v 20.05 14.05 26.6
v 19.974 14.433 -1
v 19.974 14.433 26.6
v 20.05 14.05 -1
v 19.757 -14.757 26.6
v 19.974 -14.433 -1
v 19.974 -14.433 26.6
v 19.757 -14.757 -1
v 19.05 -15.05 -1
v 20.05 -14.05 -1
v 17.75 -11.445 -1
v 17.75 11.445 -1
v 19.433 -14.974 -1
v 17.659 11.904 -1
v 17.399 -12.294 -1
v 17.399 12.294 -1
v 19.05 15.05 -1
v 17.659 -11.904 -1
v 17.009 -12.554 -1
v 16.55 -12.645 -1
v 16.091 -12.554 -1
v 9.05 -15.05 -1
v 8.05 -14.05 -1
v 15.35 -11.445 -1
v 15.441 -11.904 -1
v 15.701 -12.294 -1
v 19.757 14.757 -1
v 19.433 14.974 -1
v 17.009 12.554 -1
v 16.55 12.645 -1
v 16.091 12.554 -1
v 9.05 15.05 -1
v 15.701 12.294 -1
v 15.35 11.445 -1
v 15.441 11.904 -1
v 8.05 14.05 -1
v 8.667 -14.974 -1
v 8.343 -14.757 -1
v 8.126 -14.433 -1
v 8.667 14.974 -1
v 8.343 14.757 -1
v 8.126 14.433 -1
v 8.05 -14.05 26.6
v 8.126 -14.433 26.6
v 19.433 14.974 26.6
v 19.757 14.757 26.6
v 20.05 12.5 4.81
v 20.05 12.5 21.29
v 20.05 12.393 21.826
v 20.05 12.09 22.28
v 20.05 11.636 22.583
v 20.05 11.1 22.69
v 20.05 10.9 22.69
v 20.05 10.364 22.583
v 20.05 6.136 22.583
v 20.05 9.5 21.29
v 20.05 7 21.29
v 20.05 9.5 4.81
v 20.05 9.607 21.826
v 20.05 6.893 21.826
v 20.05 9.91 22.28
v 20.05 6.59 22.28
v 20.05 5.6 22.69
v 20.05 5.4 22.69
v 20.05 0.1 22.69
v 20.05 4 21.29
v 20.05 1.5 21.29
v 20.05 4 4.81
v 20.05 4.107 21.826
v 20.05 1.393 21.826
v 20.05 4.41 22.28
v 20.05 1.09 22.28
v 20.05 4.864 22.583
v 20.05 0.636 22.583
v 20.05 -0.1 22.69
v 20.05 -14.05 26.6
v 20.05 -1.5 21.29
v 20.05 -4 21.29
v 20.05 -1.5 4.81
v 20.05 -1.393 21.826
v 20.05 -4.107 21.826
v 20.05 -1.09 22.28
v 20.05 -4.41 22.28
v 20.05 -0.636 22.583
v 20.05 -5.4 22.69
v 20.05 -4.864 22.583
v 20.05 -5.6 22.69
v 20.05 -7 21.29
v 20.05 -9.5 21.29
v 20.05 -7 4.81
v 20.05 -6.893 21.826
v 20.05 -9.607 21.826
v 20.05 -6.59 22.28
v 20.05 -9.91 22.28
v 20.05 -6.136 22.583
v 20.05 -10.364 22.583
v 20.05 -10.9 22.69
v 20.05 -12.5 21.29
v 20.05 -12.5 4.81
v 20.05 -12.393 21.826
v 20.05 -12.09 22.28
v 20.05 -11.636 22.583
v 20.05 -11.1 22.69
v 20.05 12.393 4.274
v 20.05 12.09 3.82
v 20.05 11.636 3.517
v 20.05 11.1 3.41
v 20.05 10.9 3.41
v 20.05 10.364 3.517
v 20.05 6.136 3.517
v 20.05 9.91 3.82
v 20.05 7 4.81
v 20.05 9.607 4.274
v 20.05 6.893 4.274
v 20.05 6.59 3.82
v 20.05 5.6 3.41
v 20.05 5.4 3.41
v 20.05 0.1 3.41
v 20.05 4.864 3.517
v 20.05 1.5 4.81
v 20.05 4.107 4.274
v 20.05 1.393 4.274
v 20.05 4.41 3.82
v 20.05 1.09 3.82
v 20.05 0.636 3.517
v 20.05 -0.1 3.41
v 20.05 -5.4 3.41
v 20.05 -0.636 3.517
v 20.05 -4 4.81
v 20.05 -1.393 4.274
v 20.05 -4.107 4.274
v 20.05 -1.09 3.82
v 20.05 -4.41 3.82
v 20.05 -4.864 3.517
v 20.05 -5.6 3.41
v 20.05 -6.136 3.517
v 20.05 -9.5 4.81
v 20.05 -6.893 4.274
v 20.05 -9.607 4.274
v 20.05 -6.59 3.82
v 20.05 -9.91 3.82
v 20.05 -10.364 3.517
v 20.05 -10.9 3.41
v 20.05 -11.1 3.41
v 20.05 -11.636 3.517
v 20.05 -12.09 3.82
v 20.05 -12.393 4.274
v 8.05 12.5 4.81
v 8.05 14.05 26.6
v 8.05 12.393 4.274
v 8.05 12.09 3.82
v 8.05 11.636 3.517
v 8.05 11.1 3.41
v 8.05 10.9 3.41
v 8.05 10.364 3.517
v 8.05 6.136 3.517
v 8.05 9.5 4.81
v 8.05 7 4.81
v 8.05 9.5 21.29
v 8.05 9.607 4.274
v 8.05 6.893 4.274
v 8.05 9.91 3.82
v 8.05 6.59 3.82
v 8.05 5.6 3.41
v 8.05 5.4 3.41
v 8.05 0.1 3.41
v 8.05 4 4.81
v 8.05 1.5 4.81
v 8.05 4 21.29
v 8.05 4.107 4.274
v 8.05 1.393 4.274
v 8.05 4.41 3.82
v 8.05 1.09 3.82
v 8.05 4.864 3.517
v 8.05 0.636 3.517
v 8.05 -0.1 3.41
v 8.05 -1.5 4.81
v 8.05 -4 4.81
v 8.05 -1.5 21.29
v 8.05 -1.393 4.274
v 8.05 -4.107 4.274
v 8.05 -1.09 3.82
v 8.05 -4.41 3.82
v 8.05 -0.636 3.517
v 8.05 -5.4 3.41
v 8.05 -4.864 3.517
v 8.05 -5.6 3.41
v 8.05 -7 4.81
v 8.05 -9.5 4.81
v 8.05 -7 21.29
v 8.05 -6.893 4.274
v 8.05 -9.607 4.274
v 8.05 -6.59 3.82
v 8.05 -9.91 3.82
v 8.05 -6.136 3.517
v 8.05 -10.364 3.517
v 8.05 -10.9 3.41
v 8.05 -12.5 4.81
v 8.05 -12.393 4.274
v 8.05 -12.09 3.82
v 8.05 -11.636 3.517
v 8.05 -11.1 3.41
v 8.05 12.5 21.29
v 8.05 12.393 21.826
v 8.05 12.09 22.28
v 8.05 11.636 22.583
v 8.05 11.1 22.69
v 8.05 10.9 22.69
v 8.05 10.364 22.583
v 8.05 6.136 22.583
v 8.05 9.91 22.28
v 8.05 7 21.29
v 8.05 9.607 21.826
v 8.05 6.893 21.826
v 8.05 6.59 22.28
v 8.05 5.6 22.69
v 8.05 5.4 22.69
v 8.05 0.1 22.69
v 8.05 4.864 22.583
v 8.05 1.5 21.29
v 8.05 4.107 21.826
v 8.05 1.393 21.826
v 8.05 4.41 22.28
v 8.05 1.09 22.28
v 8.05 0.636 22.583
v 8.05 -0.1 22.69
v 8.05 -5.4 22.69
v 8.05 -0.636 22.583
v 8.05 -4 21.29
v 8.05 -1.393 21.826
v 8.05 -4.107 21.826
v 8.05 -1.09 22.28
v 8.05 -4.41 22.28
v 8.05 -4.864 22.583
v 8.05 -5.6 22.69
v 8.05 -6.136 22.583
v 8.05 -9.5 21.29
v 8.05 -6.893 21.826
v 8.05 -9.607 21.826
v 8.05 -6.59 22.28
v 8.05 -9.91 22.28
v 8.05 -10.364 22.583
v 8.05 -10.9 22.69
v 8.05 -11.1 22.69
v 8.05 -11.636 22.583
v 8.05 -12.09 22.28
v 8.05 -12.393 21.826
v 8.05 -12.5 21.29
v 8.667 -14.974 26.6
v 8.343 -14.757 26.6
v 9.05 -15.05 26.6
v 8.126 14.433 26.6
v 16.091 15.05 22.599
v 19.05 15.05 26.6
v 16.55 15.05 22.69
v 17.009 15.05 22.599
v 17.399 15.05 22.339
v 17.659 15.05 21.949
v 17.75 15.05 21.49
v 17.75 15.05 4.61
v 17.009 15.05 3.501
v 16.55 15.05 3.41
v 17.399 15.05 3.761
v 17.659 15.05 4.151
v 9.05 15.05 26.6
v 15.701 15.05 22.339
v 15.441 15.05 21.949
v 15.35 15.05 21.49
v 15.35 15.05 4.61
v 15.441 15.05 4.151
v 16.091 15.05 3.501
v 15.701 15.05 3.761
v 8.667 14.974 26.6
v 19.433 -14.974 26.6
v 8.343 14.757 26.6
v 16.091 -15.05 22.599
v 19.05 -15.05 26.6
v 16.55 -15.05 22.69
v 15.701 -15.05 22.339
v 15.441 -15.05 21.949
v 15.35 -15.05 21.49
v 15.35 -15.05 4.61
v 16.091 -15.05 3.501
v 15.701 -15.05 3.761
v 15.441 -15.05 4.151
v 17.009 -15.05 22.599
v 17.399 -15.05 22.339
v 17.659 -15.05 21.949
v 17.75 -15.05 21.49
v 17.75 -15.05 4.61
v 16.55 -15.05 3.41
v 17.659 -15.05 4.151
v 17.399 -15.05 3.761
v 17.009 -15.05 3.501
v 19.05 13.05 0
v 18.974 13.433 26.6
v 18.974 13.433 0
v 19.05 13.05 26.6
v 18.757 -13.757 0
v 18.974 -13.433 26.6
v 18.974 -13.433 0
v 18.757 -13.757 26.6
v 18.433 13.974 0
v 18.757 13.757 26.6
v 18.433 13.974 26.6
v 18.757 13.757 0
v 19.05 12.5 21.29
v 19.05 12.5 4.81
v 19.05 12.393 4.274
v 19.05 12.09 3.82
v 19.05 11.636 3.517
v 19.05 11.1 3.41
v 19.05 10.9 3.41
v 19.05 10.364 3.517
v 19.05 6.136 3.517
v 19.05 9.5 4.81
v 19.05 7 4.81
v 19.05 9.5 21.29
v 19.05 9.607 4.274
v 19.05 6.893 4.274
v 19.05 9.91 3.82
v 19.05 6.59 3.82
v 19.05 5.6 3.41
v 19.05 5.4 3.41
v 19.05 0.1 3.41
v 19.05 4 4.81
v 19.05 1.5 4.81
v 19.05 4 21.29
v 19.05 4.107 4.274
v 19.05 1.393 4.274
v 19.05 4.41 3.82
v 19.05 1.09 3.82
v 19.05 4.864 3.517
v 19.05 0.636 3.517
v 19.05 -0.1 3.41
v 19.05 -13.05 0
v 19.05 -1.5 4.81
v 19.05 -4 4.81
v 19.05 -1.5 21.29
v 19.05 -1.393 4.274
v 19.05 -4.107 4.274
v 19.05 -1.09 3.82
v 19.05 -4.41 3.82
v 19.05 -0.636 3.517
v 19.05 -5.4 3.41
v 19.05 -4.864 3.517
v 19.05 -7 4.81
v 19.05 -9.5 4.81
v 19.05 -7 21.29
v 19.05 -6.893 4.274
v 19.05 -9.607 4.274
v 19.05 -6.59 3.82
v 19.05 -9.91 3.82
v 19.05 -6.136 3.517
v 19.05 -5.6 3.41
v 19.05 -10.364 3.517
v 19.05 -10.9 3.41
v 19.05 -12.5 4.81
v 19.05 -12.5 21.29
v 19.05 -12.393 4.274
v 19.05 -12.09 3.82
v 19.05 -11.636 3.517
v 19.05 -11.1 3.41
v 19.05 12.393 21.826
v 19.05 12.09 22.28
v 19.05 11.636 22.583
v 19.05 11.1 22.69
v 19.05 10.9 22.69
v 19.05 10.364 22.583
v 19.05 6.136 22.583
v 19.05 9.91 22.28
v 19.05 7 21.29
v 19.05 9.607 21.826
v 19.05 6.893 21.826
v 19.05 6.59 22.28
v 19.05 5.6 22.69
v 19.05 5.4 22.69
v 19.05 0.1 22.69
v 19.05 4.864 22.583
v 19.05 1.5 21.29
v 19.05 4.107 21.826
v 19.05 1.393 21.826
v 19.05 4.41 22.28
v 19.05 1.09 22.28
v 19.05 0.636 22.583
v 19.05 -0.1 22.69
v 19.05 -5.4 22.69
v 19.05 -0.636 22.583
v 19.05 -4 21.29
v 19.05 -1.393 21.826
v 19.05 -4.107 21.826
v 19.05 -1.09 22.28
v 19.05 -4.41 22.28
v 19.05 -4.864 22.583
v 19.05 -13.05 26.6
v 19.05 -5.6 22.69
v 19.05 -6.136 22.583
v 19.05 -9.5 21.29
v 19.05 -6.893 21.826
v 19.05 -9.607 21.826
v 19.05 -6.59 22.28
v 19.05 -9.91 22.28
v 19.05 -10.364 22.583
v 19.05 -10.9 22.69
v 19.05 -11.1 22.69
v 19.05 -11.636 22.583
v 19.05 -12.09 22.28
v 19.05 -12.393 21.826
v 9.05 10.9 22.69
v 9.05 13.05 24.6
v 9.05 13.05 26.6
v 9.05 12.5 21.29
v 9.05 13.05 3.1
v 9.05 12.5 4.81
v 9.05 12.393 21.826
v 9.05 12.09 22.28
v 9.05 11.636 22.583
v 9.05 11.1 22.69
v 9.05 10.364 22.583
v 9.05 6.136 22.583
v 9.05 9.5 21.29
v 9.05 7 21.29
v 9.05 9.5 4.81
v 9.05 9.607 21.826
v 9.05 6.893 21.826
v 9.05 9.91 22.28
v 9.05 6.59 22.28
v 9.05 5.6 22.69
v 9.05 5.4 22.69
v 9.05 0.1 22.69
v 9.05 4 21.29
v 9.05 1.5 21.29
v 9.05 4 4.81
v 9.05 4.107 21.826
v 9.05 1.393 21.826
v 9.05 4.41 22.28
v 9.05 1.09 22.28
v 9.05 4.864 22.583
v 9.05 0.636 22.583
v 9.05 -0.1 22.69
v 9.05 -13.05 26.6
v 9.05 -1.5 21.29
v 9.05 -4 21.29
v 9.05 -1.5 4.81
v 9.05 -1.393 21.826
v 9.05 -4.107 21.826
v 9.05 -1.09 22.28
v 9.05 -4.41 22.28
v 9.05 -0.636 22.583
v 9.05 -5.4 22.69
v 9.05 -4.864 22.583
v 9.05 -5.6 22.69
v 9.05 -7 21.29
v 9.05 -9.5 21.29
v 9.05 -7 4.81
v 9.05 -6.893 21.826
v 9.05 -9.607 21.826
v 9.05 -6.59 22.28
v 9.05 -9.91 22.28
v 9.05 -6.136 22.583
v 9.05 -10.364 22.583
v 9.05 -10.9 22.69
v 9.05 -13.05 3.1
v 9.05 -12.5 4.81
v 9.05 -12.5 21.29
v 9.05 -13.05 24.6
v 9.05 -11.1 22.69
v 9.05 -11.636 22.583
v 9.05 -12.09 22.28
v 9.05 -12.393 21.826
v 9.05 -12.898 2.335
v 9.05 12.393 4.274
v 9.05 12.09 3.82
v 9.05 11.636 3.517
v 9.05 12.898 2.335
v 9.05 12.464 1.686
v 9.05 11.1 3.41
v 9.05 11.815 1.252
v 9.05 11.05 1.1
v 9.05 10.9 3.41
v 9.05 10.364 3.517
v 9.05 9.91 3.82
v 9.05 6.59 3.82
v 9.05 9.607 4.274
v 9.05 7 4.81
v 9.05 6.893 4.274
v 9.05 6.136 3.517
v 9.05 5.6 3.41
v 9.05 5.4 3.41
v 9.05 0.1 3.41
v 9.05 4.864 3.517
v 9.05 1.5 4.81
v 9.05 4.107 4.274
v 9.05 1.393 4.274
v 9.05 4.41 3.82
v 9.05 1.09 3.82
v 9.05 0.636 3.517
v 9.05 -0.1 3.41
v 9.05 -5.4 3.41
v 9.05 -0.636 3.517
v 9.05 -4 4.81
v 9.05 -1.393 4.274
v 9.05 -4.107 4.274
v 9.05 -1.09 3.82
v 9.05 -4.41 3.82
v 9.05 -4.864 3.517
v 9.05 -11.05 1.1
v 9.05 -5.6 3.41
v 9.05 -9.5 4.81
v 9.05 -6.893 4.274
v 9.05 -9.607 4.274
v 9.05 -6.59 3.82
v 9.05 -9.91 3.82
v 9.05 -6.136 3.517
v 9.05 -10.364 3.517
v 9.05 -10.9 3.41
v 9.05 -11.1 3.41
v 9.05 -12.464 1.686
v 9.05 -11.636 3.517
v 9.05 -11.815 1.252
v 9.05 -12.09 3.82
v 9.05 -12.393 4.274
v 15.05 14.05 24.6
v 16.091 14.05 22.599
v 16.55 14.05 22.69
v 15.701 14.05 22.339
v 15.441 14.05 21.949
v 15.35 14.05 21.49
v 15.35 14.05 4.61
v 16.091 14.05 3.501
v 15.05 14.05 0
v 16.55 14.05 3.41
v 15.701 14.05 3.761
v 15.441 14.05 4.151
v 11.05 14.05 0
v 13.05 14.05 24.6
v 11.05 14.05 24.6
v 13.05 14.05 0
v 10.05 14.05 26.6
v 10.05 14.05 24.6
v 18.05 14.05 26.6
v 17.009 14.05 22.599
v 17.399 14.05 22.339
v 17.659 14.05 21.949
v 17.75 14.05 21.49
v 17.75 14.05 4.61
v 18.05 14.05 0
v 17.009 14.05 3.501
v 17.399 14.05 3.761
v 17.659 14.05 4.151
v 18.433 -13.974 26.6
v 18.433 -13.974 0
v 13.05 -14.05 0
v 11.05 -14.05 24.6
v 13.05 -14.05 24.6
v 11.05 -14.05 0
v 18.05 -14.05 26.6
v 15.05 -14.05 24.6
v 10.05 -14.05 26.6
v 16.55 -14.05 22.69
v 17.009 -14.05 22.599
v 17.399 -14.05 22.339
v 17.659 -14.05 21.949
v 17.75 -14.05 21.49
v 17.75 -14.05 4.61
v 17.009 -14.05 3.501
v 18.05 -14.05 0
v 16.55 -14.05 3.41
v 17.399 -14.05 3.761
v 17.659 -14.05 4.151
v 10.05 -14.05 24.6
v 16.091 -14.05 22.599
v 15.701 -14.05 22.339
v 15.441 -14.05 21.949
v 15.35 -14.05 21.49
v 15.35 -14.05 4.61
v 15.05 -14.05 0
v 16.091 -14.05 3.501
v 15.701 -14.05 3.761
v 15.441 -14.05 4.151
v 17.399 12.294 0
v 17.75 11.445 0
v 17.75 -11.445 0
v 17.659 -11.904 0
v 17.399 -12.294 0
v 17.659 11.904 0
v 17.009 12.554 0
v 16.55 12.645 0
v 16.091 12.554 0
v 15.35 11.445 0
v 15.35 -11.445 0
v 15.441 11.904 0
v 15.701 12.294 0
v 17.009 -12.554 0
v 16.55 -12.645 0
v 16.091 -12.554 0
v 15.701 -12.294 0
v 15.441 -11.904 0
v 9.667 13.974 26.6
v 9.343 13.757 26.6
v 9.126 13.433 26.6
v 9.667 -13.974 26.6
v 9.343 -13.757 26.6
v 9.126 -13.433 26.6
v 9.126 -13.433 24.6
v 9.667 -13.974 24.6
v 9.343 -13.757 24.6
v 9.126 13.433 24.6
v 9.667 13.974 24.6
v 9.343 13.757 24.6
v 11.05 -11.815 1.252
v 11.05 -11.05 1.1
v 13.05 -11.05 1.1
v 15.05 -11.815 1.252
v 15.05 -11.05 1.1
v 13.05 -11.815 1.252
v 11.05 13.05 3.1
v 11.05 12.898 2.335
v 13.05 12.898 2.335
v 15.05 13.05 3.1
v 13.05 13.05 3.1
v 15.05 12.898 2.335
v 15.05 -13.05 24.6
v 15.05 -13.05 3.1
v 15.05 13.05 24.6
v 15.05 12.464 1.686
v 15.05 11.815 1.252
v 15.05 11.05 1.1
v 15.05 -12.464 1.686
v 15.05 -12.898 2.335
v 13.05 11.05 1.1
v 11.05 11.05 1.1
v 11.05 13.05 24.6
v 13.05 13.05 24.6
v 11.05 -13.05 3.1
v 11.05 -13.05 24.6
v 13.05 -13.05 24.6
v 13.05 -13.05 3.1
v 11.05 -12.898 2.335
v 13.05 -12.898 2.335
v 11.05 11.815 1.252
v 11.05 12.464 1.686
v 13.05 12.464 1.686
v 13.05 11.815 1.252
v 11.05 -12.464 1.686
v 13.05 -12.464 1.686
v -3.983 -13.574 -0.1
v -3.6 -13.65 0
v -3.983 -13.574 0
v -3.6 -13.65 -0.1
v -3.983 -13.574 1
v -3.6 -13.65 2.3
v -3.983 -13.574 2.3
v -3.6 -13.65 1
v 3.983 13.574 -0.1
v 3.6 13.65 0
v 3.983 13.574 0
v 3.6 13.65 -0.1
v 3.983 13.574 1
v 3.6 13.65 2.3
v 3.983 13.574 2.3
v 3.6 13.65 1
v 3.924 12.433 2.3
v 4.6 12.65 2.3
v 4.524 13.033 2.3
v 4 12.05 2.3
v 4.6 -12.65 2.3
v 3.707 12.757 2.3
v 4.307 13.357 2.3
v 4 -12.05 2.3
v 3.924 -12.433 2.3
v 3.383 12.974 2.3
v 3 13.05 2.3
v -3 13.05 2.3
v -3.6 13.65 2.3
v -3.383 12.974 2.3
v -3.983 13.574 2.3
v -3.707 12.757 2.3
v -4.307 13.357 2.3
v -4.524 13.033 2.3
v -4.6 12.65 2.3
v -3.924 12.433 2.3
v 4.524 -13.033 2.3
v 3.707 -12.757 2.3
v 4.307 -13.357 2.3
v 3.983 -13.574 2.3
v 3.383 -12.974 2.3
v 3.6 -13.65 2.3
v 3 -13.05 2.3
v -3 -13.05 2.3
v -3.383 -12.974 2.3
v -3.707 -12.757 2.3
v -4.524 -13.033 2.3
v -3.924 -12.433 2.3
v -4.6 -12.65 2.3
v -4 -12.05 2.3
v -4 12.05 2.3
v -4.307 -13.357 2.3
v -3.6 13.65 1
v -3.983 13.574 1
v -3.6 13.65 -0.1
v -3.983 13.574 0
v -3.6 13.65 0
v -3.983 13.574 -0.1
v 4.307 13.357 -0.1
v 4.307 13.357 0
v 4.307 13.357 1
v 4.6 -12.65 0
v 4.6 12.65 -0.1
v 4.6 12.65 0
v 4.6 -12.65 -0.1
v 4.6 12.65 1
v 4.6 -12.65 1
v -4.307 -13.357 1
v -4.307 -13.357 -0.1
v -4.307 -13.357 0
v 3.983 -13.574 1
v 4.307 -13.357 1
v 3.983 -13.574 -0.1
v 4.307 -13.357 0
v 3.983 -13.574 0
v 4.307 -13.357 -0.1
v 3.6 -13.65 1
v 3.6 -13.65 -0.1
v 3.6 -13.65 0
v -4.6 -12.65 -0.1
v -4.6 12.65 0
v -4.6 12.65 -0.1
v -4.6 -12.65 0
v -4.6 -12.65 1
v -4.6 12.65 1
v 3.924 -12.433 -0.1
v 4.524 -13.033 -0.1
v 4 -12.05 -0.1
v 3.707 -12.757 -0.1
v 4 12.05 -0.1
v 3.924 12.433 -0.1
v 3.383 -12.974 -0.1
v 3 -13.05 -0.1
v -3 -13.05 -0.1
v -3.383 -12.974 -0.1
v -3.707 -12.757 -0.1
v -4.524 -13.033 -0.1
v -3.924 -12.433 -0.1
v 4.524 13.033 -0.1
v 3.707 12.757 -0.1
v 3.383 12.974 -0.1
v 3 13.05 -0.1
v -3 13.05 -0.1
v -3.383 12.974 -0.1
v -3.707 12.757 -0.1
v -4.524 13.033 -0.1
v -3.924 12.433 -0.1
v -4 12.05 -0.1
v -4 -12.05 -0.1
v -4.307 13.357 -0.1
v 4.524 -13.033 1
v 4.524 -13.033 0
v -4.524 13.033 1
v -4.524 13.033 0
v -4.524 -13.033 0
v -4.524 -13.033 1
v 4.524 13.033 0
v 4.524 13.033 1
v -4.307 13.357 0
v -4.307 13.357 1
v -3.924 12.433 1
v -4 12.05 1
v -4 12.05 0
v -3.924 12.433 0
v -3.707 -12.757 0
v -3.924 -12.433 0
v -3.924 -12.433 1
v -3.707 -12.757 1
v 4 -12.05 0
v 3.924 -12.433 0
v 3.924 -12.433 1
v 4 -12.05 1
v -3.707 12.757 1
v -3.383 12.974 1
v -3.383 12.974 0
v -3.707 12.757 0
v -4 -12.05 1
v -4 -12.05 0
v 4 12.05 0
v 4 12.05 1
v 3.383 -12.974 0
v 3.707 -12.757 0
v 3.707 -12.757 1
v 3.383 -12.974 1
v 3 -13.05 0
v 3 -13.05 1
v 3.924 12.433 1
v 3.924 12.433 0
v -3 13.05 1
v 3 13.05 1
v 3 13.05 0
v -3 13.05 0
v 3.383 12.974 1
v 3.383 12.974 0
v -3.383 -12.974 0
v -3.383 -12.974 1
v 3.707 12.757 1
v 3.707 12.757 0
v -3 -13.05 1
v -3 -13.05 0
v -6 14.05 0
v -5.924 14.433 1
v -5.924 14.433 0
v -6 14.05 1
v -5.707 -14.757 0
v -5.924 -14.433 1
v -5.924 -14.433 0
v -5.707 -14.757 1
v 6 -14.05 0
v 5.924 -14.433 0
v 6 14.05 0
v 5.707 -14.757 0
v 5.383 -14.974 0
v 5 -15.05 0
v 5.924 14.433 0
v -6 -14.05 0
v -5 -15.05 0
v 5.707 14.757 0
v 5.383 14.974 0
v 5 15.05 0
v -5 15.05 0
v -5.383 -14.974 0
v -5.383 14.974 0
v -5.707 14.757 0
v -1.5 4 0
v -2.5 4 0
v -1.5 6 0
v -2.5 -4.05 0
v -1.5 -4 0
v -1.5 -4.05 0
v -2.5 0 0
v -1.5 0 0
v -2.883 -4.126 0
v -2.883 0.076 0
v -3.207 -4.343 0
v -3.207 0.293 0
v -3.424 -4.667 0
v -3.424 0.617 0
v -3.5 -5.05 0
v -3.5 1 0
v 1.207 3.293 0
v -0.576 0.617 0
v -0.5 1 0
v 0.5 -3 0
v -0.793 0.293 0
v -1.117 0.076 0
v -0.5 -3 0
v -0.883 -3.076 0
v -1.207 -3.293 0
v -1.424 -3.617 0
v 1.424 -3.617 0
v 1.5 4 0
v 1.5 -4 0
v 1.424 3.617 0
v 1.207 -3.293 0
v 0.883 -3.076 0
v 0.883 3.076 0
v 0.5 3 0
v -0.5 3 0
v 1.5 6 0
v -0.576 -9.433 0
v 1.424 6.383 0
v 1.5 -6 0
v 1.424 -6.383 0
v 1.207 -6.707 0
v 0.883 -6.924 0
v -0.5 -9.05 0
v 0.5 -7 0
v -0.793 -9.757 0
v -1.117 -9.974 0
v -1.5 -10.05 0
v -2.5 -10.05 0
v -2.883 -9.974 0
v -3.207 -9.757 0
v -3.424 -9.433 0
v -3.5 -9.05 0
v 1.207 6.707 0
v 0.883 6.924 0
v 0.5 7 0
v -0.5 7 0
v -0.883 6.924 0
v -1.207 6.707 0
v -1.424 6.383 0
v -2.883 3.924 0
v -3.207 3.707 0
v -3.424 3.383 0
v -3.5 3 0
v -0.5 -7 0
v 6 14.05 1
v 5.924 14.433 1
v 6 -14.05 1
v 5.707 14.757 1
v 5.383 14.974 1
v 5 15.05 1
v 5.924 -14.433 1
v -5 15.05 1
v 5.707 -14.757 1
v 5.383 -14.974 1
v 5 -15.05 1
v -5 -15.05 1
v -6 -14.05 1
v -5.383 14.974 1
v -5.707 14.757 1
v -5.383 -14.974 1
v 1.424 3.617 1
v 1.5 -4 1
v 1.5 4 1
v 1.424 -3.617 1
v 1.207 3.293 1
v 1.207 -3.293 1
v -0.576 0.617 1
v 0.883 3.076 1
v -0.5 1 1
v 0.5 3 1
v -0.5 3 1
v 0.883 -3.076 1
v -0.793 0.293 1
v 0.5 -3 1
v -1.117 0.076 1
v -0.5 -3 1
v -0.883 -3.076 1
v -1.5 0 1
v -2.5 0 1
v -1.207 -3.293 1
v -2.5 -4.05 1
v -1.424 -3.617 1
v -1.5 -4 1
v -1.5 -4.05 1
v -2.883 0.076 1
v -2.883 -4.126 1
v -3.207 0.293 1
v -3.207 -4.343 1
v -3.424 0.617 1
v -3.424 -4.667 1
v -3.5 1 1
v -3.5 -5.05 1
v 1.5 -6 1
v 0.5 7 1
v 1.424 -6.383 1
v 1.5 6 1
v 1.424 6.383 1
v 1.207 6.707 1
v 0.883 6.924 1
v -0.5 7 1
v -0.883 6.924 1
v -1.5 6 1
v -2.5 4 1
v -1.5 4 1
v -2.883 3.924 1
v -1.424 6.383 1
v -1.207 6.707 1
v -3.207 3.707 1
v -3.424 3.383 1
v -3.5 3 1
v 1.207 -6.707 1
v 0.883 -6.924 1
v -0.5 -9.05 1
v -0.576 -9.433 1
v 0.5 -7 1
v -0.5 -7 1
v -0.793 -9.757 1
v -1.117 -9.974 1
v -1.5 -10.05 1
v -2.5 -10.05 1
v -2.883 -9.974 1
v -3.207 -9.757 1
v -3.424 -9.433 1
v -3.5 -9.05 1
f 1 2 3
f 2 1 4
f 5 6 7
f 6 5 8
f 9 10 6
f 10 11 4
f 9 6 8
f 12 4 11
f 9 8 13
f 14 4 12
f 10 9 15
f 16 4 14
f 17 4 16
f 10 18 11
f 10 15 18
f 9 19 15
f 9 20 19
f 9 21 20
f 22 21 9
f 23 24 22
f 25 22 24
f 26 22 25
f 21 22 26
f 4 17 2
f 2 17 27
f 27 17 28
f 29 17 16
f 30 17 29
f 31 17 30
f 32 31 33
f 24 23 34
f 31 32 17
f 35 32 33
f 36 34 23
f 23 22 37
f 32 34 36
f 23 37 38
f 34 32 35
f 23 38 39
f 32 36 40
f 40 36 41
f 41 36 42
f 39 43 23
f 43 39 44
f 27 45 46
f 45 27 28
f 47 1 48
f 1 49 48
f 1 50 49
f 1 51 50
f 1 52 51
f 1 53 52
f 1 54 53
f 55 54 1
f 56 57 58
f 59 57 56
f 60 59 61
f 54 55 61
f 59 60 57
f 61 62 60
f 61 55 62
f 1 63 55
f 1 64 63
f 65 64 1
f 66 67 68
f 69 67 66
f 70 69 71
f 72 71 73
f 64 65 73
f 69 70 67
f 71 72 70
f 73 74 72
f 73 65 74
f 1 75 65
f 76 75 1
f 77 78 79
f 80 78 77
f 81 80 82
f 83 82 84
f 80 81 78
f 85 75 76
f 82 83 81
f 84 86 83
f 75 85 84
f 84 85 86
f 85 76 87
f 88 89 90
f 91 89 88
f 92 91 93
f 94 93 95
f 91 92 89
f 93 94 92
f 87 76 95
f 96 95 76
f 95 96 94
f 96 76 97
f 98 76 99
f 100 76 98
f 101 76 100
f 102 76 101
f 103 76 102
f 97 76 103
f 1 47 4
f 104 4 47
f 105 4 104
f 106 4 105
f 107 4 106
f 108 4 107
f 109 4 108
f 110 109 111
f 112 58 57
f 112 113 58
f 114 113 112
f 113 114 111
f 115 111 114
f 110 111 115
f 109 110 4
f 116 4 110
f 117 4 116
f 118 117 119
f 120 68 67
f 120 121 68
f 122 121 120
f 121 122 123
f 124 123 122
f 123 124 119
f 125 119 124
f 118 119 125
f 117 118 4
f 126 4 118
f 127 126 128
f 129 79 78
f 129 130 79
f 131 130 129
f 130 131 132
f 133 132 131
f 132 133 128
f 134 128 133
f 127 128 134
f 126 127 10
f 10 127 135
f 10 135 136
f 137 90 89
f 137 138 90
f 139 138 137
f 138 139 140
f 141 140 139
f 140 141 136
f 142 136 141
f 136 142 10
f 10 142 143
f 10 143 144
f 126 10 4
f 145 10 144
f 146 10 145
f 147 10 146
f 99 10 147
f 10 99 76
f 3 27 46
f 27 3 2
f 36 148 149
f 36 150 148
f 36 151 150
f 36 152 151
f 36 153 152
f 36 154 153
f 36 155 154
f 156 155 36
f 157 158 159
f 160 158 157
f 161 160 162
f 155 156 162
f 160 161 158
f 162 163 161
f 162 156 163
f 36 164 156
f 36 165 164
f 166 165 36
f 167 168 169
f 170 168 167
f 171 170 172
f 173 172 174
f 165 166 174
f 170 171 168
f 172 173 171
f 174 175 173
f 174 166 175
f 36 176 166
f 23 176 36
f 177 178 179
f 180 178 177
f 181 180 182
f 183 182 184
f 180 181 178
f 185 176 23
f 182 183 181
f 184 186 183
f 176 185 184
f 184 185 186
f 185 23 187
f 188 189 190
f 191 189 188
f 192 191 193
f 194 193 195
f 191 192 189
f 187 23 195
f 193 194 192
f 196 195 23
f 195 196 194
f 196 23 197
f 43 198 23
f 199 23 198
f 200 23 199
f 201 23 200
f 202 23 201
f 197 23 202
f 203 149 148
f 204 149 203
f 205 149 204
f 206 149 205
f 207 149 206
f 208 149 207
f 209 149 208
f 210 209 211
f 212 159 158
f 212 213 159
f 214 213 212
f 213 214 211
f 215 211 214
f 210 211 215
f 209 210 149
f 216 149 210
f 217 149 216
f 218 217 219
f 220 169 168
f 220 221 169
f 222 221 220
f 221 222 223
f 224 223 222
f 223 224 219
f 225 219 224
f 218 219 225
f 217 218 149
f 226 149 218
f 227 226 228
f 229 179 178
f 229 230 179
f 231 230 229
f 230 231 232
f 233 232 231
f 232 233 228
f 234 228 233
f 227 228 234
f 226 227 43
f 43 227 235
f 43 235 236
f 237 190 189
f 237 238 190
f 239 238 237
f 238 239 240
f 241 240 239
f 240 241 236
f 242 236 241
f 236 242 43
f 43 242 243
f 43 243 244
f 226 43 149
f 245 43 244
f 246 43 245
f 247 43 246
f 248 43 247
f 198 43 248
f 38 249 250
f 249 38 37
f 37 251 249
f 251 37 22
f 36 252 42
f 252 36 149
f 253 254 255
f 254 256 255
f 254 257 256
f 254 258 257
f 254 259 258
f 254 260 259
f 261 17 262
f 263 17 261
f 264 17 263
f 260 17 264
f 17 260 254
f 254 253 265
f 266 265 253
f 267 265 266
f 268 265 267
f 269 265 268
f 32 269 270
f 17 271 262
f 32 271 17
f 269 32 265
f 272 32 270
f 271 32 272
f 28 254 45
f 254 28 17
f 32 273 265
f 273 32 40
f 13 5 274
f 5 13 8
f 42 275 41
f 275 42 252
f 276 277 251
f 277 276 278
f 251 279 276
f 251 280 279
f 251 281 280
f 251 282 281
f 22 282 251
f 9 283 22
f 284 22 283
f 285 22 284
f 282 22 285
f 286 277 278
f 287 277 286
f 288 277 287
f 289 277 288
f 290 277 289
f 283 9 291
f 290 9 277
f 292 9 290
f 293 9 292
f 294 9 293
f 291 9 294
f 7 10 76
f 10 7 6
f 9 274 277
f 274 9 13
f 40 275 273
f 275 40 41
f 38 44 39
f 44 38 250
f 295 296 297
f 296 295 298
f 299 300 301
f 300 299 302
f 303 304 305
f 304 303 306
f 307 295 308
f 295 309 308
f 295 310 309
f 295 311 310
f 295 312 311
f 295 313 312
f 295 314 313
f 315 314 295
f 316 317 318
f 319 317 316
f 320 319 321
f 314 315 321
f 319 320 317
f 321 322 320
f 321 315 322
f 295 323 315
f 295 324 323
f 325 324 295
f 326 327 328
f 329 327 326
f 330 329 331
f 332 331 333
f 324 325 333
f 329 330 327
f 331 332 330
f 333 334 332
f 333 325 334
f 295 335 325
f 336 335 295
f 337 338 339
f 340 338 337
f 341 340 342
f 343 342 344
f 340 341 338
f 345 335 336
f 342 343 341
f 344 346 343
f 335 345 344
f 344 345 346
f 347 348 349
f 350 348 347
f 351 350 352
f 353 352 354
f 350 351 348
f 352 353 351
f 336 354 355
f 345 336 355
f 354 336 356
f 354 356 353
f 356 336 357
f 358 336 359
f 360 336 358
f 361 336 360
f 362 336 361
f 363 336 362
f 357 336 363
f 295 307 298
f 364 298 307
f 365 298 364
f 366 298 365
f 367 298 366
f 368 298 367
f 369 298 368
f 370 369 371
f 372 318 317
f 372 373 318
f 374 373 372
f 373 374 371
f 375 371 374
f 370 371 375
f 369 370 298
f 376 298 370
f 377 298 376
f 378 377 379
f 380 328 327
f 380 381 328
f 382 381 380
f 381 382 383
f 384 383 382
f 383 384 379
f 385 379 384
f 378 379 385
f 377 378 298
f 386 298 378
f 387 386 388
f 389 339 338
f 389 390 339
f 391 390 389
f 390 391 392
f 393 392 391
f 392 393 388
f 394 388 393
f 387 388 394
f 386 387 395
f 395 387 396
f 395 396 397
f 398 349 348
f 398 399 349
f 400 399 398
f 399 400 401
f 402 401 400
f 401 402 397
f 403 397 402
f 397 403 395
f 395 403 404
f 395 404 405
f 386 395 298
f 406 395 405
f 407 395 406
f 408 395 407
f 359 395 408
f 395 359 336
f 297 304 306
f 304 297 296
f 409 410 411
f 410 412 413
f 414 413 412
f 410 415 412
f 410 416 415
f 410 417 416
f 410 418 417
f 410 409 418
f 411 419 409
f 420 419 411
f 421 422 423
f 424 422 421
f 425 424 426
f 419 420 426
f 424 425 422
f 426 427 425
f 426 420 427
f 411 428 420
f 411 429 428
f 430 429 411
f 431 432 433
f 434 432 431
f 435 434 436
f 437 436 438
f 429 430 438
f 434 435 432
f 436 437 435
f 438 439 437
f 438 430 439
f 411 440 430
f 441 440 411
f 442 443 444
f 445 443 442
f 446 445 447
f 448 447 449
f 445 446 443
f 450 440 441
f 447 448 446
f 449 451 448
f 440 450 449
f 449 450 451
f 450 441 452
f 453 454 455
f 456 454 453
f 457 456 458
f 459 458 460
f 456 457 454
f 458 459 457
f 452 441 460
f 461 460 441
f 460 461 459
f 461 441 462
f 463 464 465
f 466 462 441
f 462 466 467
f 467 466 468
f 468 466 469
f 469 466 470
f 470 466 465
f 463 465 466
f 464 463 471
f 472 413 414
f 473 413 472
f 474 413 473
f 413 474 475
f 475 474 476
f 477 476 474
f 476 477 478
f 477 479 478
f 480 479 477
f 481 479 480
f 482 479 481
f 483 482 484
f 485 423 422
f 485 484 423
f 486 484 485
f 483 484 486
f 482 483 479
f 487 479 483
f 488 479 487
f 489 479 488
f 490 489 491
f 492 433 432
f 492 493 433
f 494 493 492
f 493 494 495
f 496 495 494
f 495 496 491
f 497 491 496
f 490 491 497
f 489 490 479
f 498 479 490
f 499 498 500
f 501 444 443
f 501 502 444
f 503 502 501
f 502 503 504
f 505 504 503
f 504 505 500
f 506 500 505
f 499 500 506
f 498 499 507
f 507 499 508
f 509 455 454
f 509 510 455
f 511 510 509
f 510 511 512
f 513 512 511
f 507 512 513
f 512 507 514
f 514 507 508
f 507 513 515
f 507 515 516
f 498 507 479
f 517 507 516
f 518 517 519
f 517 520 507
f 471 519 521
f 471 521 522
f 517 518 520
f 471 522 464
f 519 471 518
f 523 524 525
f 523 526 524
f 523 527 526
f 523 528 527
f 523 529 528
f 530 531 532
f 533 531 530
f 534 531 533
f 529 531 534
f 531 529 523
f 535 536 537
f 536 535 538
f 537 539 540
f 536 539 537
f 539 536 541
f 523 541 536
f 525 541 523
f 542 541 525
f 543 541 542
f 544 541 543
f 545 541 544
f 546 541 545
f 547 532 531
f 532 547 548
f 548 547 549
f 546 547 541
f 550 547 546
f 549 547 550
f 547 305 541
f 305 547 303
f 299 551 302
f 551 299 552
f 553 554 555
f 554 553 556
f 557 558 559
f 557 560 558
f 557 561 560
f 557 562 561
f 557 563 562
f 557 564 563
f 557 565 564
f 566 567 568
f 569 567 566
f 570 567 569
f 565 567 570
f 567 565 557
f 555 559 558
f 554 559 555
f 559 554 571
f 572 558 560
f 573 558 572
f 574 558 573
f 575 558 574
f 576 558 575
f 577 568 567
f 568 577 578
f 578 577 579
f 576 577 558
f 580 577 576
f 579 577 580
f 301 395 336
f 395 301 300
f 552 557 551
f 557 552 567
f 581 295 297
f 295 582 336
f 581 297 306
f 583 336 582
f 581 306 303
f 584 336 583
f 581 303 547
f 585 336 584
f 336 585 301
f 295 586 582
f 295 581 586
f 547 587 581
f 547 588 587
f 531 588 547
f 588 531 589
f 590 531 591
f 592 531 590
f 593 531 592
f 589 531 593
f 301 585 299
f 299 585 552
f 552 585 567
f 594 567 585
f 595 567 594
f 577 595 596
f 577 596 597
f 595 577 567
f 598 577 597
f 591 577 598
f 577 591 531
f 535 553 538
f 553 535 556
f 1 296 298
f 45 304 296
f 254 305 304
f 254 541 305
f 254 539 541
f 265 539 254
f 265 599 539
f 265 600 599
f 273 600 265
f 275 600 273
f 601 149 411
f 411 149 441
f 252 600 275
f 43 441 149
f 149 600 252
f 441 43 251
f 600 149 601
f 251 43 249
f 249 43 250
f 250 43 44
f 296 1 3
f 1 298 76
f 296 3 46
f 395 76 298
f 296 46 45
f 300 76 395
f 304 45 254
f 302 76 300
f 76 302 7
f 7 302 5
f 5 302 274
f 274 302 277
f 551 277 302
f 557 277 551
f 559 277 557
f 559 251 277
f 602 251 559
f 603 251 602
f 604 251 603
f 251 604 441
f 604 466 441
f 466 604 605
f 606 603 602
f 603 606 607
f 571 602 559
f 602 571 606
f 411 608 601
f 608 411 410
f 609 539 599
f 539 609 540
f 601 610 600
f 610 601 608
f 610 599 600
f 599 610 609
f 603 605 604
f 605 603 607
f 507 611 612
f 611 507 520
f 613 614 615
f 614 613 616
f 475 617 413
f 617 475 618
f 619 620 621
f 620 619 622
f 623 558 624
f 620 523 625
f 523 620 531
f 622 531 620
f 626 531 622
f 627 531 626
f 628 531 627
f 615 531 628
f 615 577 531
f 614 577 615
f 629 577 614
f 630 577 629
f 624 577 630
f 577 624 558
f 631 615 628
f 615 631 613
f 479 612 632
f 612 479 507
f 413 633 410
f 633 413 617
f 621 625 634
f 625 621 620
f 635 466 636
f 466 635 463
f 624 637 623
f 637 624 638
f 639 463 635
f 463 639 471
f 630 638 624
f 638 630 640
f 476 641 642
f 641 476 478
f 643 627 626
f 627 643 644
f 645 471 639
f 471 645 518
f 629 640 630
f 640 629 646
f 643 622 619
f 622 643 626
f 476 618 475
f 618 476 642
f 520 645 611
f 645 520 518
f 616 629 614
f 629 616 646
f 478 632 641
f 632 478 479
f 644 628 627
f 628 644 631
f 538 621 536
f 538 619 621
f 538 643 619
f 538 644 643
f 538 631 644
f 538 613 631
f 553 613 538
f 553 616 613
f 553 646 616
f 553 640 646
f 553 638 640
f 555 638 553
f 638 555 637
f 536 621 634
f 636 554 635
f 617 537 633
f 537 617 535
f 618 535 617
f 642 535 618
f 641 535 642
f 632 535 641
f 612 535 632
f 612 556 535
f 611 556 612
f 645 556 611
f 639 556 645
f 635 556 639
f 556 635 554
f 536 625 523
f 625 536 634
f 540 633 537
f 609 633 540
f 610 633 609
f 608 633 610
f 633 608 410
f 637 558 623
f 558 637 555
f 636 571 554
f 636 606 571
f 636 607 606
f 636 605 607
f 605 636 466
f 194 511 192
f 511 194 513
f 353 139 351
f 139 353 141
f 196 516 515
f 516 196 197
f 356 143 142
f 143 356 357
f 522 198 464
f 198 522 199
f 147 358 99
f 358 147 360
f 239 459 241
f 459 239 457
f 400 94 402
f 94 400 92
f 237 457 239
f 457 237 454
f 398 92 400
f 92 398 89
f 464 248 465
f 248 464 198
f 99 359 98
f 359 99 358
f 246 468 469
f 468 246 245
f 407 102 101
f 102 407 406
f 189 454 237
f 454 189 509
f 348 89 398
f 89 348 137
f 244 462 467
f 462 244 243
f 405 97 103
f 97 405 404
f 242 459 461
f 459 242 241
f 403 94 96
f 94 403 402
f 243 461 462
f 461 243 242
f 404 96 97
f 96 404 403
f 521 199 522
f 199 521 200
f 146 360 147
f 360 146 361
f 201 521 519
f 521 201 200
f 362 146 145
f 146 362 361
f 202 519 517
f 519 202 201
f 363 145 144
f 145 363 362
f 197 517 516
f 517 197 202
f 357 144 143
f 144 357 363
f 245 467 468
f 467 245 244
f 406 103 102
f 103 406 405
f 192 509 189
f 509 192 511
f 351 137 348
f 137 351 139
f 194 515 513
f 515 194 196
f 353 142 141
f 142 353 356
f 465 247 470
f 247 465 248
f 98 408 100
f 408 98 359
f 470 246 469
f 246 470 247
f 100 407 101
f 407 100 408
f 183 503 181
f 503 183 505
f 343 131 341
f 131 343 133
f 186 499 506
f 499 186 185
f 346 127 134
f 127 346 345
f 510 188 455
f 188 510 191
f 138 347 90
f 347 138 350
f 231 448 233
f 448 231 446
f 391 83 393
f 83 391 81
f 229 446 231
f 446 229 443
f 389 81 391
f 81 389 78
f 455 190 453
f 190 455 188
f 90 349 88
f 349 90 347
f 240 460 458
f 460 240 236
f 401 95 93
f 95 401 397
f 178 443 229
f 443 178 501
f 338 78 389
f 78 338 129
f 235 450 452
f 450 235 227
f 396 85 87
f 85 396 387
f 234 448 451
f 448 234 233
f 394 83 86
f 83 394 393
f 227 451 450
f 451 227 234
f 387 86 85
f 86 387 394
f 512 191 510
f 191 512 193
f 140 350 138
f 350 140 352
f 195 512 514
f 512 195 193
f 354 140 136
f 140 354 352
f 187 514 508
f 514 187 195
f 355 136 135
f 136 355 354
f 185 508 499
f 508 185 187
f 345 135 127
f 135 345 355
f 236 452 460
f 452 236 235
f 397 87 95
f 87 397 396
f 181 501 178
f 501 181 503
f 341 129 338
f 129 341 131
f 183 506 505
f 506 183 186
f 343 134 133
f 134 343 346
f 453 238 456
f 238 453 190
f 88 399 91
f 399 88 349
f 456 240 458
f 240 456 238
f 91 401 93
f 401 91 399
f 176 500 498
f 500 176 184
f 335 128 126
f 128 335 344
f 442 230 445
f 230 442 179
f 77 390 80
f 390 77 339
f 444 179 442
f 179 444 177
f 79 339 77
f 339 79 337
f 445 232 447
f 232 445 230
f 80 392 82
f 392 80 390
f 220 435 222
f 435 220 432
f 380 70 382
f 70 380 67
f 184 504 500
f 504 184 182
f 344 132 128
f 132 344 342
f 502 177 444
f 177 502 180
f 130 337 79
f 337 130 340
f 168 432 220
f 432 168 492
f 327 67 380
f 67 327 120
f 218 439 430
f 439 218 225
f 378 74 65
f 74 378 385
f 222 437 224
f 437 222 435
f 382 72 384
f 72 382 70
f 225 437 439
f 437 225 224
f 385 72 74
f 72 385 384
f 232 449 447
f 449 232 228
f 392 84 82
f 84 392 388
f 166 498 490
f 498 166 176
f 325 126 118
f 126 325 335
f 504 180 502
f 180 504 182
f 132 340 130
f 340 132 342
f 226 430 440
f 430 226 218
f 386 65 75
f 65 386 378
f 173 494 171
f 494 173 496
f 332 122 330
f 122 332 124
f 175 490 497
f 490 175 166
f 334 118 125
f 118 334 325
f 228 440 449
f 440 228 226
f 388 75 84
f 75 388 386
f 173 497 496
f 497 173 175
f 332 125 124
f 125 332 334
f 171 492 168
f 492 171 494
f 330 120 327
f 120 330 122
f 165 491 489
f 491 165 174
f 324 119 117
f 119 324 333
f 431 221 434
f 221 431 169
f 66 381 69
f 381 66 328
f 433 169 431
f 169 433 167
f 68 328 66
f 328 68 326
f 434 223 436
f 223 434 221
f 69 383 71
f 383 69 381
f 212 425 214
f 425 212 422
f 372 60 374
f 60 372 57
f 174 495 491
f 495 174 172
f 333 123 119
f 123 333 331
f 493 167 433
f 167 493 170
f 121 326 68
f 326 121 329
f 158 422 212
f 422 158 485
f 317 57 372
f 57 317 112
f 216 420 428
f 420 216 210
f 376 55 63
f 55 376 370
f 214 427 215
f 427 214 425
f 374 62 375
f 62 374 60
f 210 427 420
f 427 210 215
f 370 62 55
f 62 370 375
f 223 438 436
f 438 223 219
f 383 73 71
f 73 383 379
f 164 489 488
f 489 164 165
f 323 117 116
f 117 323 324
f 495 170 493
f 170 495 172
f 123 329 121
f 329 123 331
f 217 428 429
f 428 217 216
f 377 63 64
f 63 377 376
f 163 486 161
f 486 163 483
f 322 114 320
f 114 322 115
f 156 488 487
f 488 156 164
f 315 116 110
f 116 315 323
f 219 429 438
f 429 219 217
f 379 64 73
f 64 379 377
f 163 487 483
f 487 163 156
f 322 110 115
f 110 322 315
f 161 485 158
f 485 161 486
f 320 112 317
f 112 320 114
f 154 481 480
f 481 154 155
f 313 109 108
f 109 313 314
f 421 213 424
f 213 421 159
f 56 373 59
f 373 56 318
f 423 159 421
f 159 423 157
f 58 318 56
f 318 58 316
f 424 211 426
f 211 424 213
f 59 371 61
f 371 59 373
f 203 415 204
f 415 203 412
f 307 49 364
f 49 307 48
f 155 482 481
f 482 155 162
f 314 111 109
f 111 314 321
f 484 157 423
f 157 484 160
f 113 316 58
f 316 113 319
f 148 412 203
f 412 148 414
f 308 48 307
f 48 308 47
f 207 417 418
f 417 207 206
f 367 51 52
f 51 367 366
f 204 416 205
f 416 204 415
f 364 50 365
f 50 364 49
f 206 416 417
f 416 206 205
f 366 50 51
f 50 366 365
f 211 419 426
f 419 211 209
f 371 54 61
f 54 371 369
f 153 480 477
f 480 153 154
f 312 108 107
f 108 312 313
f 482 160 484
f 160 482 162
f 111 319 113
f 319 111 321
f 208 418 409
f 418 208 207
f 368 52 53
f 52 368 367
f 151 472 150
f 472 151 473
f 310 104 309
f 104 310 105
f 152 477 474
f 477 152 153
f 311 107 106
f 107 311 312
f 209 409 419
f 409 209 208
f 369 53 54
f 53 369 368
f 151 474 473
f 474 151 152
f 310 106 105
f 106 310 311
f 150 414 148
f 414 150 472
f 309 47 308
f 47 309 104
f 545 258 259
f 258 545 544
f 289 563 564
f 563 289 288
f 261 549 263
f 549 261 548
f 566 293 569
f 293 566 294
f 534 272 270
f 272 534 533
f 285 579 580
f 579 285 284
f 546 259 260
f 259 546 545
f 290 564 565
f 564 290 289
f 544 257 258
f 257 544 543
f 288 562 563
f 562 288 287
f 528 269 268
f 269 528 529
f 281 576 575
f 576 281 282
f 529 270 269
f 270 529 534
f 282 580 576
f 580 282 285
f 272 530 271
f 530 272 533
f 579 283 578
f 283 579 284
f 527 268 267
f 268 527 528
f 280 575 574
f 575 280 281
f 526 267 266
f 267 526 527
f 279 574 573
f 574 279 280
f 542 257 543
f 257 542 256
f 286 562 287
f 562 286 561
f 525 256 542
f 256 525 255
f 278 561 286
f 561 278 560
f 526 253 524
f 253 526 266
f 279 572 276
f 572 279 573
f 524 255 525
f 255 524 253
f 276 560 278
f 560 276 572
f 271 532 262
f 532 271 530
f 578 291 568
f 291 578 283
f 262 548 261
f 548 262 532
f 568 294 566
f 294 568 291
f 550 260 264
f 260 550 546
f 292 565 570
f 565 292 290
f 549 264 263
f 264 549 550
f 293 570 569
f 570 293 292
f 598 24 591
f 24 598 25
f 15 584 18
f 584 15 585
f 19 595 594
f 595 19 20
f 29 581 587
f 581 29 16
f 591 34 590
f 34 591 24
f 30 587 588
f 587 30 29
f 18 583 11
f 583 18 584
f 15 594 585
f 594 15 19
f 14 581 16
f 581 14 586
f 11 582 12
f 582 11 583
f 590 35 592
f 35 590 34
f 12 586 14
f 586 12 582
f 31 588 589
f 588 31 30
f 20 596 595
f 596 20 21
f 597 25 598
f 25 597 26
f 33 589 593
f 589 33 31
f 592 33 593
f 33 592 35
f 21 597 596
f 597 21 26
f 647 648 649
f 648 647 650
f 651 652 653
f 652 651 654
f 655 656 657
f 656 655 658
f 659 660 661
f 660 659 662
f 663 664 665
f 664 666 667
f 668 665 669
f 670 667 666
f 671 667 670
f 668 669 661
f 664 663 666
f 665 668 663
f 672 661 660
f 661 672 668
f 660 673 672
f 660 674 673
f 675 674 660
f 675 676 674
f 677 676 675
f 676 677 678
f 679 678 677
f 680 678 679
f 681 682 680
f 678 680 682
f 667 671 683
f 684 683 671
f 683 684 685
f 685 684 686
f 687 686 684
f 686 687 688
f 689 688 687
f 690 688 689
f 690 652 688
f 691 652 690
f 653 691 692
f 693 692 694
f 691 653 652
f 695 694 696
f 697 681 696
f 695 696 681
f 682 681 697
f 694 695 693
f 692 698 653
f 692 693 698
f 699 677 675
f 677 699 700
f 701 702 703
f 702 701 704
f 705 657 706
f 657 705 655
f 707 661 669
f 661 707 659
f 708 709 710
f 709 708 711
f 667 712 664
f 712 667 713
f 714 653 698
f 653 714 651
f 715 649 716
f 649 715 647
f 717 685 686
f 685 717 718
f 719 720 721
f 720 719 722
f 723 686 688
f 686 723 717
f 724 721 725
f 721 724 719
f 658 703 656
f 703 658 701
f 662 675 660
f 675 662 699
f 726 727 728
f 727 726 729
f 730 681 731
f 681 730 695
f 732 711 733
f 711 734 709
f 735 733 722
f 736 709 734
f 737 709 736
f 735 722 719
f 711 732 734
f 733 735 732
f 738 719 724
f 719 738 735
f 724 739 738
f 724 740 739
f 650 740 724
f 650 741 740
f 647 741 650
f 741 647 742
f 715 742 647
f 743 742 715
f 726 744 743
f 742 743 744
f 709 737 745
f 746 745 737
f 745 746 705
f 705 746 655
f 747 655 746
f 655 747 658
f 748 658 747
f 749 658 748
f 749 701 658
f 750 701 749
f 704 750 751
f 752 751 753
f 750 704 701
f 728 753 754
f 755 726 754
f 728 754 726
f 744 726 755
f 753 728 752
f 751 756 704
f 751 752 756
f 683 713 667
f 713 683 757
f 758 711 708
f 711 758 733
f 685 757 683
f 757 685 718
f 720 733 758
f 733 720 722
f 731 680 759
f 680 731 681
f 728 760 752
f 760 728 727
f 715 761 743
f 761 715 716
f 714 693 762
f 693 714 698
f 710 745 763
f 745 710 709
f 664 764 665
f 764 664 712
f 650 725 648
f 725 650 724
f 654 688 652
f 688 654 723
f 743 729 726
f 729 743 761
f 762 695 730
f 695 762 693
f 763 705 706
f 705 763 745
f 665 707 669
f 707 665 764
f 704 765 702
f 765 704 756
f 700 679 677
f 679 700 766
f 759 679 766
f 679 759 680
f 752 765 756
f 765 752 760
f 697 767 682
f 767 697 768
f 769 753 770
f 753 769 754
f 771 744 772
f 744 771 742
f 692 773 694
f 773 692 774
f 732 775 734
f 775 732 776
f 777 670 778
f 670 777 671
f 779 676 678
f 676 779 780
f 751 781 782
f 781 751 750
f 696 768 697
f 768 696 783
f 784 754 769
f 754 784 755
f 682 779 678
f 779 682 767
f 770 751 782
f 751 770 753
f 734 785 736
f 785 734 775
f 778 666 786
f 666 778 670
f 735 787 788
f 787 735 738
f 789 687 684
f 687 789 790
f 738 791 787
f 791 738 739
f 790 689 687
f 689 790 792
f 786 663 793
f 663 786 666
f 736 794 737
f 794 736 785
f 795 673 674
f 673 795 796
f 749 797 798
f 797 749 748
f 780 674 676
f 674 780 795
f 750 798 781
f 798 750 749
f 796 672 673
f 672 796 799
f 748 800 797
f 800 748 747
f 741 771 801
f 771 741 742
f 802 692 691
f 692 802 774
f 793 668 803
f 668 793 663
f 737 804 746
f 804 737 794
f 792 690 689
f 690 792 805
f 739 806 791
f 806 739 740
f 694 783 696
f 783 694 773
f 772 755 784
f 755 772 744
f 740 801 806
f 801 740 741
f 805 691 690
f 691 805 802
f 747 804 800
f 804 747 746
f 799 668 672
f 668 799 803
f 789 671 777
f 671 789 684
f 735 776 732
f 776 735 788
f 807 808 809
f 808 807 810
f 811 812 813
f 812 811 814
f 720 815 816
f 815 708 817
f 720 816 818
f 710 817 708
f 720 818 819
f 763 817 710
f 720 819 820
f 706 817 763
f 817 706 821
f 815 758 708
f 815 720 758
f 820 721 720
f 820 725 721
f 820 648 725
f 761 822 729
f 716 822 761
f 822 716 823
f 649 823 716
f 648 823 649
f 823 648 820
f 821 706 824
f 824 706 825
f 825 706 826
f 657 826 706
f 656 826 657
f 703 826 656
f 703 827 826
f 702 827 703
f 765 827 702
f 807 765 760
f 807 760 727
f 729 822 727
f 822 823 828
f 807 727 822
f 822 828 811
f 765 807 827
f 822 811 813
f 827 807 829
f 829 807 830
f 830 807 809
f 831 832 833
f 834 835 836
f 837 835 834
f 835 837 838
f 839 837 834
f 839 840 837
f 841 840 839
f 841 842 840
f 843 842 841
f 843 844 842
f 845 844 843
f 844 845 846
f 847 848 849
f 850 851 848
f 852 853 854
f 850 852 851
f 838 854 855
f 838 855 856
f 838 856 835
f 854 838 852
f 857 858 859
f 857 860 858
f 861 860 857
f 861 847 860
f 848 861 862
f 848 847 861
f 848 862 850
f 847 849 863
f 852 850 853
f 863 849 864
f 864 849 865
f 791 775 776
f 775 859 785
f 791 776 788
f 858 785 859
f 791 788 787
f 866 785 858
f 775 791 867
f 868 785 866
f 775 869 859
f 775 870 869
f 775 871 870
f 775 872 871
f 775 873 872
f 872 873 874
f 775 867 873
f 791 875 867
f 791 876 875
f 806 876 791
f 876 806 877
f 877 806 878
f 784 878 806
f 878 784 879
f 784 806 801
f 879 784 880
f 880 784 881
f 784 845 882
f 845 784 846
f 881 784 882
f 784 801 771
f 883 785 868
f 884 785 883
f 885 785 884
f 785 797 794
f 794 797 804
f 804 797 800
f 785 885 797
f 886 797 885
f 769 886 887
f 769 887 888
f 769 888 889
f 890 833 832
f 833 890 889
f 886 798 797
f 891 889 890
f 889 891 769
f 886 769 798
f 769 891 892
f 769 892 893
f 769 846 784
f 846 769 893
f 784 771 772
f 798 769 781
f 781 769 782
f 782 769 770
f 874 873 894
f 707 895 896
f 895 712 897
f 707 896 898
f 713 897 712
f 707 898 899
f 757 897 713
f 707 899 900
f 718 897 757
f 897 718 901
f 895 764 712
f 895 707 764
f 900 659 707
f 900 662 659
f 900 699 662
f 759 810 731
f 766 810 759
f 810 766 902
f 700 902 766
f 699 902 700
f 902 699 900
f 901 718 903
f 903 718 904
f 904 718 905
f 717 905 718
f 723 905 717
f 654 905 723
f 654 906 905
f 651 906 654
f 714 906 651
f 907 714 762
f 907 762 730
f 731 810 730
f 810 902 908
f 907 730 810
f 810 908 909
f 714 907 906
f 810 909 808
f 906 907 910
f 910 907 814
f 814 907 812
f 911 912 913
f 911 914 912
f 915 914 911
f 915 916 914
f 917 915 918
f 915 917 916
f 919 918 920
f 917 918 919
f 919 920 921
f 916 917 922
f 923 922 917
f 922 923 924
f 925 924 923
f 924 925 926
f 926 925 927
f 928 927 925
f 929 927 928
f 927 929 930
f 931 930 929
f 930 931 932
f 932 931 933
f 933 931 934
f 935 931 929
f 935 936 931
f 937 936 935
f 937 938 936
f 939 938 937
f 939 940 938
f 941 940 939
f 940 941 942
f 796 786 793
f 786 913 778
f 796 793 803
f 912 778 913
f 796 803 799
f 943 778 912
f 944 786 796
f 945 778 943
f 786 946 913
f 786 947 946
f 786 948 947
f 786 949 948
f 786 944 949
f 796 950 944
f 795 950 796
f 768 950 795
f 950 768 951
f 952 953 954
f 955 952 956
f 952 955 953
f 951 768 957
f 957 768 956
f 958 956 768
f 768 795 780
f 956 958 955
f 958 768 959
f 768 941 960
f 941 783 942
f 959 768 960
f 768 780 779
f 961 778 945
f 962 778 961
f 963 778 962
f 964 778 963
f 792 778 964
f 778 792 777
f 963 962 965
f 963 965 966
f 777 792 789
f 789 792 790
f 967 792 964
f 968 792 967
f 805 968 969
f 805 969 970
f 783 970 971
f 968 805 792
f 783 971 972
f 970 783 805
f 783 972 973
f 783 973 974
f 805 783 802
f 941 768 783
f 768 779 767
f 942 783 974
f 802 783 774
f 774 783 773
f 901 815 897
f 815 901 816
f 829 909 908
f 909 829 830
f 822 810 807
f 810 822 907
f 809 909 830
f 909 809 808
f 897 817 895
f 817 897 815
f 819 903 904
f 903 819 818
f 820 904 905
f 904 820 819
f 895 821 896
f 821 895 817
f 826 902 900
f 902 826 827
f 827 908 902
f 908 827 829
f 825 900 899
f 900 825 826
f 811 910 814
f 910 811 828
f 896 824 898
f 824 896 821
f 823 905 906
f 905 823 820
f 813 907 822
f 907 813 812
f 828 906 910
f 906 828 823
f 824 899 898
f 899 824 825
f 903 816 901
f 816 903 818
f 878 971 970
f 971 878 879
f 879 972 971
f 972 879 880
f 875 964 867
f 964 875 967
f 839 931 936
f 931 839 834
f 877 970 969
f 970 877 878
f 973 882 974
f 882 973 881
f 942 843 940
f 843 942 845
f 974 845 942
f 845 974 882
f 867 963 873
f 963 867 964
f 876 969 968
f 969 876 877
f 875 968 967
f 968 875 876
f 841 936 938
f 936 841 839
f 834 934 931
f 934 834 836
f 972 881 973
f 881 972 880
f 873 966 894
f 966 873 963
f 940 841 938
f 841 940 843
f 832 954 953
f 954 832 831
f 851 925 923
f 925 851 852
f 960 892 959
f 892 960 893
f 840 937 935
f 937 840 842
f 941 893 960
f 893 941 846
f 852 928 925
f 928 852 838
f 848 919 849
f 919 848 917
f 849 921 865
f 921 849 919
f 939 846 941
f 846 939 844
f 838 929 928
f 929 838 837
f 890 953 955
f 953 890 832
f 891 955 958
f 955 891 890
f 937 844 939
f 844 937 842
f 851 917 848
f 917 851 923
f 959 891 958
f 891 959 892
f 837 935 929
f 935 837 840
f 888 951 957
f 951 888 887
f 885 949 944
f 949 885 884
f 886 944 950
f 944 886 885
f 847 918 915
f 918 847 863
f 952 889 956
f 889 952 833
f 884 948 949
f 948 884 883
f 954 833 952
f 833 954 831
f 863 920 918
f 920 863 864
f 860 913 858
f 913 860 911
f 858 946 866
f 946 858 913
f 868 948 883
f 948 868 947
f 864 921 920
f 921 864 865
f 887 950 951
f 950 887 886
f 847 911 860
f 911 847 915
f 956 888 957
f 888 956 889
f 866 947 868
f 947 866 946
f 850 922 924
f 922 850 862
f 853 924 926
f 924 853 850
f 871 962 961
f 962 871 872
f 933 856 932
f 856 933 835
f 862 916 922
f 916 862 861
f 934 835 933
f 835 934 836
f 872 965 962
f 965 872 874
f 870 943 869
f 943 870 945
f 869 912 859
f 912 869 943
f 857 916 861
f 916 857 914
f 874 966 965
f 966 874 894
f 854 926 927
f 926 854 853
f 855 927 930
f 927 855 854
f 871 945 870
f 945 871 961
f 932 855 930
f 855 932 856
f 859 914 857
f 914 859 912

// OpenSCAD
use <../MAX98306.scad>
max98306(with_vent=1, with_holder=1, with_lid=1, with_print=1);
